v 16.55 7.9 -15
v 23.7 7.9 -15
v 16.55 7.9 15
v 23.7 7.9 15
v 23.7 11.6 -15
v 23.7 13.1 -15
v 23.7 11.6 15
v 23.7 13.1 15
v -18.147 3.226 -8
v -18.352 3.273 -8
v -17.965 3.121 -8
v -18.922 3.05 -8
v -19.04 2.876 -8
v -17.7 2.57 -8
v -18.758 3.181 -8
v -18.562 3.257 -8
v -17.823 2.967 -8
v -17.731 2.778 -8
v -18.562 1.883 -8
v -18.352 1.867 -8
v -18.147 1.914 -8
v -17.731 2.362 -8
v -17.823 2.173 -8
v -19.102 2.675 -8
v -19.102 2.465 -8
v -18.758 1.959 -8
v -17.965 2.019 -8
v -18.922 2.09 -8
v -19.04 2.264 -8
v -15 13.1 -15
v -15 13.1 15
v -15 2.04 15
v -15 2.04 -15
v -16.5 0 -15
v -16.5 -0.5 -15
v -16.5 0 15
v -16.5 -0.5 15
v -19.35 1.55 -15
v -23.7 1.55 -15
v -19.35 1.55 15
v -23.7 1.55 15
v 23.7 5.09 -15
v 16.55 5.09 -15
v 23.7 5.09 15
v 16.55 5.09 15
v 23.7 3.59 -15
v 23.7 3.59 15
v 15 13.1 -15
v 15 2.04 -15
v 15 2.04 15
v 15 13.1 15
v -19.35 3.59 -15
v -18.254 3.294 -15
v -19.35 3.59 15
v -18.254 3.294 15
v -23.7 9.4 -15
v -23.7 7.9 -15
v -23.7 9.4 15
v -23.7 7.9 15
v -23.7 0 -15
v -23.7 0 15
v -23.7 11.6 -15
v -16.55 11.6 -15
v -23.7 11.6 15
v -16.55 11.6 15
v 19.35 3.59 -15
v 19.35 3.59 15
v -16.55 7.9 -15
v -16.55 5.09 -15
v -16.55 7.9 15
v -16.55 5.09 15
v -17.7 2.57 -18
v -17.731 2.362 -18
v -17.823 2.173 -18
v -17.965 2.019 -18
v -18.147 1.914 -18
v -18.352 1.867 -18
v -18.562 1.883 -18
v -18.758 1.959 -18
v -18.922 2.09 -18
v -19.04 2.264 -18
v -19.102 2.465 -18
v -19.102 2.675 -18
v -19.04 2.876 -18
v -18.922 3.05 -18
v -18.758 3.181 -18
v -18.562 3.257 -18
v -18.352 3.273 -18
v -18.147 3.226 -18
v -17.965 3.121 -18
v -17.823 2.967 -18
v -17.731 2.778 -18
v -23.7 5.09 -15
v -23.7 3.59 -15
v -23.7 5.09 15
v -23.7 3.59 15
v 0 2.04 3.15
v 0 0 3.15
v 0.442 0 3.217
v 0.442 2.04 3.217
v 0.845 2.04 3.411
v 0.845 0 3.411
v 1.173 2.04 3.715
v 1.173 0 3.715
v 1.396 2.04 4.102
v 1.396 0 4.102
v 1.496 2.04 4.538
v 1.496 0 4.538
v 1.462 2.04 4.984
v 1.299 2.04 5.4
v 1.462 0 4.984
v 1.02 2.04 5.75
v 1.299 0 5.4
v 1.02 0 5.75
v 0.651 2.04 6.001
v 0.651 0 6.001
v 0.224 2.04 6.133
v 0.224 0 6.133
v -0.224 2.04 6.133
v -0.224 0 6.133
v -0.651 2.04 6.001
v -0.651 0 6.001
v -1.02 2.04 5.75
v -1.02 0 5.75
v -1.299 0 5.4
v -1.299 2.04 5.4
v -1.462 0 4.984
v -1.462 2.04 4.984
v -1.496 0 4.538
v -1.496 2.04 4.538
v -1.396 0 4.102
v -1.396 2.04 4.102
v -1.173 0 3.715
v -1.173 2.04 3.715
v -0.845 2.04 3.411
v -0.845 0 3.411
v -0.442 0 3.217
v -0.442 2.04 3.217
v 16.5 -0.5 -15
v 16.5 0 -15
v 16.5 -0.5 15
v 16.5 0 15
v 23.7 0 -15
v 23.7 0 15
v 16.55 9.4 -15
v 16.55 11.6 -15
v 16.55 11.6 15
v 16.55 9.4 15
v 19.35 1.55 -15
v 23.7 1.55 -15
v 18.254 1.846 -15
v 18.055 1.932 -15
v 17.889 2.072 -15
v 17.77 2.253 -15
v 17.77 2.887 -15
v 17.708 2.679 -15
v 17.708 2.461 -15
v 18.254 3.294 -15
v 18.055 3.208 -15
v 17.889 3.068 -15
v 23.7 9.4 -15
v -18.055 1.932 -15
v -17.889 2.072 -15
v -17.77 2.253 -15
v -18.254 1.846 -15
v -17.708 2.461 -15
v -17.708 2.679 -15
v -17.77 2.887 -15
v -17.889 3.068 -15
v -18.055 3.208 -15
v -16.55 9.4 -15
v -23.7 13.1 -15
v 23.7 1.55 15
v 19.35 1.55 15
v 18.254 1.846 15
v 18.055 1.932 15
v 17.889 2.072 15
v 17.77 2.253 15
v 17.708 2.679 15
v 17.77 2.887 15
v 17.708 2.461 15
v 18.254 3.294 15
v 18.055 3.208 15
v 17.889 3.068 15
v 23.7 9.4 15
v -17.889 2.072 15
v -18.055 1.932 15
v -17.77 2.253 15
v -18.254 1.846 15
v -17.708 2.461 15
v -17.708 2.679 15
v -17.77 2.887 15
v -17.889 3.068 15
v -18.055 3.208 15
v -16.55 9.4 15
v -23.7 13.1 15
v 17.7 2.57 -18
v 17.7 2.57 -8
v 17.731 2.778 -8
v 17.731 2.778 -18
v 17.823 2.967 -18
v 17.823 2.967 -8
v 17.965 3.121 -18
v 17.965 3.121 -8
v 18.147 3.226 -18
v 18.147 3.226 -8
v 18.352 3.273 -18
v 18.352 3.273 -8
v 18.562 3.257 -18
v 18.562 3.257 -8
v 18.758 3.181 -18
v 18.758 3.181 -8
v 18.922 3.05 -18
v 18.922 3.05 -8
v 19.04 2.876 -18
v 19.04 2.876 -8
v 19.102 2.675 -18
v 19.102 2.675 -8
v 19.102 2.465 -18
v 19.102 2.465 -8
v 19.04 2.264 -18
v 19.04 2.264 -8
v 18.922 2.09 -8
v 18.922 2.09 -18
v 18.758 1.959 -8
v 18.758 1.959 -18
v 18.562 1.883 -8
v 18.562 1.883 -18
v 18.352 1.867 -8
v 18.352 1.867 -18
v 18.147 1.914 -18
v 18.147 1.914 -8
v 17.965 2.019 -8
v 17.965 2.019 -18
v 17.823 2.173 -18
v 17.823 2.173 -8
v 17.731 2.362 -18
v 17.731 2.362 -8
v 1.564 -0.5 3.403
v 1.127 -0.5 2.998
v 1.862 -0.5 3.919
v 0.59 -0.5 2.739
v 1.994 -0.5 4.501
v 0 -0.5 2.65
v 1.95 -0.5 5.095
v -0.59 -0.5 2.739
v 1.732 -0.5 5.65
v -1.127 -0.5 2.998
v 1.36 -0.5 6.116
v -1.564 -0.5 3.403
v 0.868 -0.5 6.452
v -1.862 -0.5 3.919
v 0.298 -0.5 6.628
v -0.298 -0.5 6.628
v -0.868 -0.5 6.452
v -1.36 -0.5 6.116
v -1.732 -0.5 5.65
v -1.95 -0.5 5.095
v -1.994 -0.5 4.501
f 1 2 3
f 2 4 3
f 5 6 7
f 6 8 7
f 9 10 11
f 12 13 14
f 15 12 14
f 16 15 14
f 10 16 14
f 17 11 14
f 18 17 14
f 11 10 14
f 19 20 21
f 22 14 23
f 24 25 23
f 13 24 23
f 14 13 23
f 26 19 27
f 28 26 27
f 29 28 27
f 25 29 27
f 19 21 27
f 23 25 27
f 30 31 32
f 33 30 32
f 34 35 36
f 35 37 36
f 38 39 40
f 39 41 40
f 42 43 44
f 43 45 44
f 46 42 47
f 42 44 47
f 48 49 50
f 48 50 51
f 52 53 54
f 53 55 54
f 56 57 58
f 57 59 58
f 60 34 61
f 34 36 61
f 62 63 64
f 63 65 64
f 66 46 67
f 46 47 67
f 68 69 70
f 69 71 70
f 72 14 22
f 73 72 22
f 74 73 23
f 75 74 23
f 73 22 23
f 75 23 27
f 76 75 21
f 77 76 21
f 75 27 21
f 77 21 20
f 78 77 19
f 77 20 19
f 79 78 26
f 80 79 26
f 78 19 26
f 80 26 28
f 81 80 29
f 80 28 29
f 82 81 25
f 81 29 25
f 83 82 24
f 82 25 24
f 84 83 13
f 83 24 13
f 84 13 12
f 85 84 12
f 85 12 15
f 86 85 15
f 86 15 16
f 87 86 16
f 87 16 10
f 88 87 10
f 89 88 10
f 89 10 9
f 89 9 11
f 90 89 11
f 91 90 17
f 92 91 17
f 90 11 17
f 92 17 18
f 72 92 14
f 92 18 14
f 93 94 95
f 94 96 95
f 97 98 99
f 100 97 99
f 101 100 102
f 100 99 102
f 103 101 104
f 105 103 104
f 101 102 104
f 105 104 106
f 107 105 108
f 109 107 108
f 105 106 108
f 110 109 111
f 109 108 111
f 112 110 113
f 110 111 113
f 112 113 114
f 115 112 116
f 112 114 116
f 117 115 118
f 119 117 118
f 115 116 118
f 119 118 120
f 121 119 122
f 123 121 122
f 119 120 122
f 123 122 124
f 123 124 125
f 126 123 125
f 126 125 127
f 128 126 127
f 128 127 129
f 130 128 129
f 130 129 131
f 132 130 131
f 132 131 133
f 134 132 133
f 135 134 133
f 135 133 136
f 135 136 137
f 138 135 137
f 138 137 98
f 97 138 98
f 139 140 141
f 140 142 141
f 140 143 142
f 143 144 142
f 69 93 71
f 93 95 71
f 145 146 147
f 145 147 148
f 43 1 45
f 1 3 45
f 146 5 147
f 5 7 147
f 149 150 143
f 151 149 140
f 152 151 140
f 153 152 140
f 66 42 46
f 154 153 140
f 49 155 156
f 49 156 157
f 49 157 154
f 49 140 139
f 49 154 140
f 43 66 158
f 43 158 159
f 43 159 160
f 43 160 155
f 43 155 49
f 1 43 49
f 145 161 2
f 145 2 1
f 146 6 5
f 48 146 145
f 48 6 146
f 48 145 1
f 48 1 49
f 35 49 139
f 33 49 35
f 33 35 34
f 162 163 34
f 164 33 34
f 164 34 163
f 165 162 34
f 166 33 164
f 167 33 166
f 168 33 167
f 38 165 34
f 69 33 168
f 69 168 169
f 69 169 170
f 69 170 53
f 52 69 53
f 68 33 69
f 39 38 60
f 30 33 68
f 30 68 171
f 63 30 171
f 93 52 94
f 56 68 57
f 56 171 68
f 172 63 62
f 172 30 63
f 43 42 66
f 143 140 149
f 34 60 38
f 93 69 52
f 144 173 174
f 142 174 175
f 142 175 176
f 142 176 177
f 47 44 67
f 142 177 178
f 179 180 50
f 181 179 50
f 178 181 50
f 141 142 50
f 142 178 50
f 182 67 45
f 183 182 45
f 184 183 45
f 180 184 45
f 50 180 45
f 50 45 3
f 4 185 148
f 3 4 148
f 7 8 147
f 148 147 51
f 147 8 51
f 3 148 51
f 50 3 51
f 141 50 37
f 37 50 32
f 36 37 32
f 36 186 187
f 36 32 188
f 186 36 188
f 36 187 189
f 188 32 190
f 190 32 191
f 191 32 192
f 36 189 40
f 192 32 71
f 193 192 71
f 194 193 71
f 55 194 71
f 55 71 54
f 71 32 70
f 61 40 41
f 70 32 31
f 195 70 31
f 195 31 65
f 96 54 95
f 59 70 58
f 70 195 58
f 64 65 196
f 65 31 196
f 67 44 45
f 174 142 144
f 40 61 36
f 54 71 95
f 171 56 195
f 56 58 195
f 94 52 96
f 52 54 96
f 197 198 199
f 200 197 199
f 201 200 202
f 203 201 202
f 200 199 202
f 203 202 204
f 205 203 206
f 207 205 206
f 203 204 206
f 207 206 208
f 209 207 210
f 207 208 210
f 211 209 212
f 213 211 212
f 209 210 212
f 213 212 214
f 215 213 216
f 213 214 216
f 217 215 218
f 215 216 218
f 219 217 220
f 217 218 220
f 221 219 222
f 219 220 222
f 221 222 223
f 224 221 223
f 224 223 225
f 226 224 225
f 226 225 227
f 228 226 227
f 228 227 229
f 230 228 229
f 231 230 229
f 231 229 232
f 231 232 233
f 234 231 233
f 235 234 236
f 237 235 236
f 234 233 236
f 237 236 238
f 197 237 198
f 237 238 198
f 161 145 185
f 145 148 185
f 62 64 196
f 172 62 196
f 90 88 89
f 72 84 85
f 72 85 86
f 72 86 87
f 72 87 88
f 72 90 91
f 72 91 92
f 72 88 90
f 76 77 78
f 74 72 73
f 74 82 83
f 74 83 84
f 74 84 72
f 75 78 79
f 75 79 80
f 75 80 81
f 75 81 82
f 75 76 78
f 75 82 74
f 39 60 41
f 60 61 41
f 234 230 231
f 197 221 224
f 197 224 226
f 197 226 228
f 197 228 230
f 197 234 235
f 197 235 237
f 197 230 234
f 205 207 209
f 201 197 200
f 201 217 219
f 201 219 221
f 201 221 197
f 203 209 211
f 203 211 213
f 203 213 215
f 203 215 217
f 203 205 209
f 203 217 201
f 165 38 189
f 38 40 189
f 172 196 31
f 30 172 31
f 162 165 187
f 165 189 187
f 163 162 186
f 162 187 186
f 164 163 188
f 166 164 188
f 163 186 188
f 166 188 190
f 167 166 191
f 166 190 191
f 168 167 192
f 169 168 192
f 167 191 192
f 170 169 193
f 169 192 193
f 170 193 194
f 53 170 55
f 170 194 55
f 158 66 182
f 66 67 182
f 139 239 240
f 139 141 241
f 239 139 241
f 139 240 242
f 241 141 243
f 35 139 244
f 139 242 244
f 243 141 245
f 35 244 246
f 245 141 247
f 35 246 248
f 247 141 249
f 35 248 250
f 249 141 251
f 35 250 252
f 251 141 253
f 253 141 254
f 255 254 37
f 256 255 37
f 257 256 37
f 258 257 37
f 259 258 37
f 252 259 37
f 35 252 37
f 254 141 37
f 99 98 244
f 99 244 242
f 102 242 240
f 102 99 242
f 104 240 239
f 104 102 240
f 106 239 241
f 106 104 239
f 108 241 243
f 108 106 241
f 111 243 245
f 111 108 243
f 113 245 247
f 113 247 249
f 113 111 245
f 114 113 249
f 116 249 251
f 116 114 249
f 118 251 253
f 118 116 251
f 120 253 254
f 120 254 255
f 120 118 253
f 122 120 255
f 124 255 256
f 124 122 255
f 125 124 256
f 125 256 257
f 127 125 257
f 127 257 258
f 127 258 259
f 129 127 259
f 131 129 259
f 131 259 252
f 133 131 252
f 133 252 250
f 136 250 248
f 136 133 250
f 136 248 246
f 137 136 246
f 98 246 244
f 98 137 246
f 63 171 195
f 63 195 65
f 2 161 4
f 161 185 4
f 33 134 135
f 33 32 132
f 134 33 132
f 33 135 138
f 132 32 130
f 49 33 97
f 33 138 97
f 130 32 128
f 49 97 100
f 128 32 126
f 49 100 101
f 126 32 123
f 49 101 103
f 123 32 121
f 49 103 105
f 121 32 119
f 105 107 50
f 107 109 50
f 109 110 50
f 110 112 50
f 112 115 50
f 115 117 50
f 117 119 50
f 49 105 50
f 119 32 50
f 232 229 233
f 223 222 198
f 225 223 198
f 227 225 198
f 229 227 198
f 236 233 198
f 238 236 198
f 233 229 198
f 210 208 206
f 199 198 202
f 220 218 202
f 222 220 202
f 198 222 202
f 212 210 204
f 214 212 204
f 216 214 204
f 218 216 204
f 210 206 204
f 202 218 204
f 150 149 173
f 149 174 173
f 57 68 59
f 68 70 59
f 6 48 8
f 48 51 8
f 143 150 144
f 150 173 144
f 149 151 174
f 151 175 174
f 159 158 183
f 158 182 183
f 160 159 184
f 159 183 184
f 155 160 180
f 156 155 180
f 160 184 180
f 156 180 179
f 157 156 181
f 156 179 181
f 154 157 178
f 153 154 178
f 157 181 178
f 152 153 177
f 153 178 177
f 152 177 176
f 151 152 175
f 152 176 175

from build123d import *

# Parameters (mm, degrees)
BOSS_EXTRUDE1_DEPTH        = 15
SKETCH2_R                  = 1.5
CUT_EXTRUDE1_DEPTH         = 32.171300903
CHAMFER1_SIZE              = 0.5
BOSS_EXTRUDE2_DEPTH        = 3
BOSS_EXTRUDE2_DEPTH_BACK   = 7
SKETCH3_R                  = 0.705
BOSS_EXTRUDE2_2_DEPTH      = 3
BOSS_EXTRUDE2_2_DEPTH_BACK = 7


with BuildPart() as part:
    # Sketch1 → Boss-Extrude1 (new, symmetric)
    with BuildSketch(Plane.XY):
        with BuildLine():
            Line((-15, 13.1), (-15, 2.04))
            Line((-15, 2.04), (15, 2.04))
            Line((15, 2.04), (15, 13.1))
            Line((15, 13.1), (23.7, 13.1))
            Line((23.7, 13.1), (23.7, 11.6))
            Line((23.7, 11.6), (16.55, 11.6))
            Line((16.55, 11.6), (16.55, 9.4))
            Line((16.55, 9.4), (23.7, 9.4))
            Line((23.7, 9.4), (23.7, 7.9))
            Line((23.7, 7.9), (16.55, 7.9))
            Line((16.55, 7.9), (16.55, 5.09))
            Line((16.55, 5.09), (23.7, 5.09))
            Line((23.7, 5.09), (23.7, 3.59))
            Line((23.7, 3.59), (19.35, 3.59))
            Line((19.35, 3.59), (18.254412307, 3.294047964))
            ThreePointArc((18.254412307, 3.294047964), (17.7, 2.57), (18.254412307, 1.845952036))
            Line((18.254412307, 1.845952036), (19.35, 1.55))
            Line((19.35, 1.55), (23.7, 1.55))
            Line((23.7, 1.55), (23.7, 0))
            Line((23.7, 0), (16.5, 0))
            Line((16.5, 0), (16.5, -0.5))
            Line((16.5, -0.5), (-16.5, -0.5))
            Line((-16.5, -0.5), (-16.5, 0))
            Line((-16.5, 0), (-23.7, 0))
            Line((-23.7, 0), (-23.7, 1.55))
            Line((-23.7, 1.55), (-19.35, 1.55))
            Line((-19.35, 1.55), (-18.254412307, 1.845952036))
            ThreePointArc((-18.254412307, 1.845952036), (-17.7, 2.57), (-18.254412307, 3.294047964))
            Line((-18.254412307, 3.294047964), (-19.35, 3.59))
            Line((-19.35, 3.59), (-23.7, 3.59))
            Line((-23.7, 3.59), (-23.7, 5.09))
            Line((-23.7, 5.09), (-16.55, 5.09))
            Line((-16.55, 5.09), (-16.55, 7.9))
            Line((-16.55, 7.9), (-23.7, 7.9))
            Line((-23.7, 7.9), (-23.7, 9.4))
            Line((-23.7, 9.4), (-16.55, 9.4))
            Line((-16.55, 9.4), (-16.55, 11.6))
            Line((-16.55, 11.6), (-23.7, 11.6))
            Line((-23.7, 11.6), (-23.7, 13.1))
            Line((-23.7, 13.1), (-15, 13.1))
        make_face()
    extrude(amount=BOSS_EXTRUDE1_DEPTH, both=True)

    # Sketch2 → Cut-Extrude1 (cut, through all)
    with BuildSketch(Plane.XZ.offset(0.5)):
        with Locations(Location((0, 4.65, 0), (0, 0, 270))):
            Circle(SKETCH2_R)
    extrude(amount=-CUT_EXTRUDE1_DEPTH, mode=Mode.SUBTRACT)

    # Chamfer1
    chamfer1_edges = [part.edges().sort_by_distance(p)[0] for p in [
        (0, -0.5, 6.15),
    ]]
    chamfer(chamfer1_edges, length=CHAMFER1_SIZE)


with BuildPart() as body_2:
    # Sketch3 → Boss-Extrude2 (new, two sides: drawn at the far end of the back side and taken through both)
    with BuildSketch(Plane(origin=(0, 0, -15), x_dir=(-1, 0, 0), z_dir=(0, 0, -1)).offset(-BOSS_EXTRUDE2_DEPTH_BACK)):
        with Locations((-18.405, 2.57)):
            Circle(SKETCH3_R)
    extrude(amount=BOSS_EXTRUDE2_DEPTH + BOSS_EXTRUDE2_DEPTH_BACK)


with BuildPart() as body_3:
    # Sketch3 → Boss-Extrude2 2 (new, two sides: drawn at the far end of the back side and taken through both)
    with BuildSketch(Plane(origin=(0, 0, -15), x_dir=(-1, 0, 0), z_dir=(0, 0, -1)).offset(-BOSS_EXTRUDE2_2_DEPTH_BACK)):
        with Locations(Location((18.405, 2.57, 0), (0, 0, 180))):
            Circle(SKETCH3_R)
    extrude(amount=BOSS_EXTRUDE2_2_DEPTH + BOSS_EXTRUDE2_2_DEPTH_BACK)


solid = Compound([part.part, body_2.part, body_3.part])
